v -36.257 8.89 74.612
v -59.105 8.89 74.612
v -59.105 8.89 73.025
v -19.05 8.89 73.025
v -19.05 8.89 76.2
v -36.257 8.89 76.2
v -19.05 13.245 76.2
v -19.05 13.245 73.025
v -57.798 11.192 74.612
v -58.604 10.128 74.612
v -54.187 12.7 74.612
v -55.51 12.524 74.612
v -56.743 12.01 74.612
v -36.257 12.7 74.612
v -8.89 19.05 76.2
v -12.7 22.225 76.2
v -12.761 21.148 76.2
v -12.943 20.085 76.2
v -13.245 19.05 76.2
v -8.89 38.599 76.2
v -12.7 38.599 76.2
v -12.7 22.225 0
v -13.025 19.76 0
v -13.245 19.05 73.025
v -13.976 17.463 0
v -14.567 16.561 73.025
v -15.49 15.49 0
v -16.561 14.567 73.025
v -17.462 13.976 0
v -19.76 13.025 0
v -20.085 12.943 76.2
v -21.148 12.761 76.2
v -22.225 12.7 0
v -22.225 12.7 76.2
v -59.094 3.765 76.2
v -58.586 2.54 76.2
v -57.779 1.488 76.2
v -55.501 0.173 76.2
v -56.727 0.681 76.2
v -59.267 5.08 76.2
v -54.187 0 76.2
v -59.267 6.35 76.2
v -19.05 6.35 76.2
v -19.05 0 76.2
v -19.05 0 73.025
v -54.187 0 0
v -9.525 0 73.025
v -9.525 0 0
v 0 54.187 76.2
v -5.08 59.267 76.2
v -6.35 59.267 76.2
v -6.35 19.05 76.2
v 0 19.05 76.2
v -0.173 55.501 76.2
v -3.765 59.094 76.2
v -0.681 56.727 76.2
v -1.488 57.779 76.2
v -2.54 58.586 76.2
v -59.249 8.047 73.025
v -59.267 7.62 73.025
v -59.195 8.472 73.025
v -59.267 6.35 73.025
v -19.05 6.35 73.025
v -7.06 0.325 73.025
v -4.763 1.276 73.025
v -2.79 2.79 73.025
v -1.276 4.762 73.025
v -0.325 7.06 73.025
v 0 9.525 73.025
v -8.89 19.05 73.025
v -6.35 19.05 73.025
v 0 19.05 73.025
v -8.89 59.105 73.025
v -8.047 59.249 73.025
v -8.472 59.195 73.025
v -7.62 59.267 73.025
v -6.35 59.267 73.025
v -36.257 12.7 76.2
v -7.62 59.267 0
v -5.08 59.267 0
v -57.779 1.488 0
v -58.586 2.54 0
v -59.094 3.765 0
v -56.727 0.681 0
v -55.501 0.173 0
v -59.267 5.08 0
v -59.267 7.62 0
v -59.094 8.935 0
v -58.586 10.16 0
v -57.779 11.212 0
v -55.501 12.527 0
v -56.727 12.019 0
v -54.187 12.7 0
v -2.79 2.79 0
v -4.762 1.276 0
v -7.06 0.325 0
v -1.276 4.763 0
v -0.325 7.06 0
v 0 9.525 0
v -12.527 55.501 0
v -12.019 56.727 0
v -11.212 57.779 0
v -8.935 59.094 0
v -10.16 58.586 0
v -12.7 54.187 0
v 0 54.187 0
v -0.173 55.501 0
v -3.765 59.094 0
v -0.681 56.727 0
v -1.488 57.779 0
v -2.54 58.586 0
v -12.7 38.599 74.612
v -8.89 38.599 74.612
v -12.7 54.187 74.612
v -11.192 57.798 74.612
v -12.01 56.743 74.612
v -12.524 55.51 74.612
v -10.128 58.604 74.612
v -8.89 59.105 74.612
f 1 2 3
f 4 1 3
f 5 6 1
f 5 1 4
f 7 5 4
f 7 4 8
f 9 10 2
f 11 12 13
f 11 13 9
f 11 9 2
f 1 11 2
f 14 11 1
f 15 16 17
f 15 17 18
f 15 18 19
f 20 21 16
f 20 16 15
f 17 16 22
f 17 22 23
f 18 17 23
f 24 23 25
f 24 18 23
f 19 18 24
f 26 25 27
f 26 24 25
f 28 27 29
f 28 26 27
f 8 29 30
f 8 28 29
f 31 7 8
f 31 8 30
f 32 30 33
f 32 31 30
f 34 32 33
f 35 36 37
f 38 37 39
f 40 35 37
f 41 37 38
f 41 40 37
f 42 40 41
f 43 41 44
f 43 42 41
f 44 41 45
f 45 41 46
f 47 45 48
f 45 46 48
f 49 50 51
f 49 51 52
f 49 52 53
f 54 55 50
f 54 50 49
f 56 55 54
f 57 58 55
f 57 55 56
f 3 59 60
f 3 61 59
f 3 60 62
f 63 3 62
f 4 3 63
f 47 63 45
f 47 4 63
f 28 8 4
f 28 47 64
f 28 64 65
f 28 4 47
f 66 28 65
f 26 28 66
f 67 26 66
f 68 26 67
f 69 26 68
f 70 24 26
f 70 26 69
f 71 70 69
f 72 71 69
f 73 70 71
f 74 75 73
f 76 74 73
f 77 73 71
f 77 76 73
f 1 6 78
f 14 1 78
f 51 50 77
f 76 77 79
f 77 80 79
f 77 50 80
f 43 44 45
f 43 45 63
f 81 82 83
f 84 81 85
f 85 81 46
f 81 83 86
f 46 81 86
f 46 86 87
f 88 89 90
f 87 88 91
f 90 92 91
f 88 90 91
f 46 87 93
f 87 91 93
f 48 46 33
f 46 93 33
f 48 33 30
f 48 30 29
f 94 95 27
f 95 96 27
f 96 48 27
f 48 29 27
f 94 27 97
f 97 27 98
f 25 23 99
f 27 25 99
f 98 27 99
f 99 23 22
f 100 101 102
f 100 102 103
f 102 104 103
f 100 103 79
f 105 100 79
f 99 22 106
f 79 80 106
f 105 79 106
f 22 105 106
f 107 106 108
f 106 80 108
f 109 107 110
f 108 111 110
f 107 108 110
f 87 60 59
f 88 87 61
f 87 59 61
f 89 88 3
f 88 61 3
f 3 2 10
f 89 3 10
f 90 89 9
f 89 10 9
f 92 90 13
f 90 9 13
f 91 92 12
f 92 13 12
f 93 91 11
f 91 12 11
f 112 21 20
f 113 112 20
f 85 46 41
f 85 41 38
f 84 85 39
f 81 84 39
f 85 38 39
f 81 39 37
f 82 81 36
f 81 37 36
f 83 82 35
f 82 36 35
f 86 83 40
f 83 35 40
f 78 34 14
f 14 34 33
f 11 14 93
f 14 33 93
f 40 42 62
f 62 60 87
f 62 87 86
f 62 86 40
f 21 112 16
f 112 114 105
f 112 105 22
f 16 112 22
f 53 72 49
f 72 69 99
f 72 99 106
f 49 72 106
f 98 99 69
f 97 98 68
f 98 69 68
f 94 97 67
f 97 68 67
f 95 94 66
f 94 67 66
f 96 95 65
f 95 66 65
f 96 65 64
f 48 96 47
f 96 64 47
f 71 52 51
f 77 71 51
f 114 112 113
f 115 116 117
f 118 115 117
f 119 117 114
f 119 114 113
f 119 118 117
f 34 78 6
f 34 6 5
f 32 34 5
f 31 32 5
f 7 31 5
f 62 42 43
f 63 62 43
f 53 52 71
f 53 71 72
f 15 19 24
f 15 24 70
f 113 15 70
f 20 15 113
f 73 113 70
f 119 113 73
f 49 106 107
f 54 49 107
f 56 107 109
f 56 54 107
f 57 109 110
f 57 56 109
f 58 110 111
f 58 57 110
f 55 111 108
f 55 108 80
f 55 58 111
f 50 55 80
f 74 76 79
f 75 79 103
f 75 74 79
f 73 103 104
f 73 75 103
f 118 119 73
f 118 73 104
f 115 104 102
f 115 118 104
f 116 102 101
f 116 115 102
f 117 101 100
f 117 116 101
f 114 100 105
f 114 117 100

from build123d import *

# Parameters (mm, degrees)
F1_DEPTH  = 76.2
F2_R      = 9.525
F4_W      = 19.05
F4_H      = 19.05
F5_DEPTH  = 3.175
F6_W      = 2.54
F6_H      = 44.45
F6_W_2    = 44.45
F6_H_2    = 2.54
F7_DEPTH  = 3.175
F8_R      = 5.08
F9_W      = 24.864539
F9_H      = 7.45066
F9_W_2    = 9.066464
F9_H_2    = 23.017317
F10_DEPTH = 1.5875


with BuildPart() as f1:
    # F0 (on Top) → F1 (new body)
    with BuildSketch(Plane.XY):
        Polygon((-12.7, 0), (0, 0), (0, 59.266667), (-12.7, 59.266667), (-12.7, 12.7), (-59.266667, 12.7), (-59.266667, 0), align=None)
    extrude(amount=F1_DEPTH)

    # F2
    f2_edges = [f1.edges().sort_by_distance(p)[0] for p in [
        (-12.7, 12.7, 38.1),
        (0, 0, 38.1),
    ]]
    fillet(f2_edges, radius=F2_R)

    # F4 (on offset) → F5 (cut)
    with BuildSketch(Plane.XY.offset(76.2)):
        with Locations((-9.525, 9.525)):
            Rectangle(F4_W, F4_H)
    extrude(amount=-F5_DEPTH, mode=Mode.SUBTRACT)

    # F6 (on offset) → F7 (cut)
    with BuildSketch(Plane.XY.offset(76.2)):
        with Locations((-7.62, 40.052507)):
            Rectangle(F6_W, F6_H)
        with Locations((-39.902898, 7.62)):
            Rectangle(F6_W_2, F6_H_2)
    extrude(amount=-F7_DEPTH, mode=Mode.SUBTRACT)

    # F8
    f8_edges = [f1.edges().sort_by_distance(p)[0] for p in [
        (-59.266667, 0, 38.1),
        (-59.266667, 12.7, 38.1),
        (-12.7, 59.266667, 38.1),
        (0, 59.266667, 38.1),
    ]]
    fillet(f8_edges, radius=F8_R)

    # F9 (on offset) → F10 (cut)
    with BuildSketch(Plane.XY.offset(76.2)):
        with Locations((-48.689407, 11.571373)):
            Rectangle(F9_W, F9_H)
        with Locations((-11.794715, 50.10781)):
            Rectangle(F9_W_2, F9_H_2)
    extrude(amount=-F10_DEPTH, mode=Mode.SUBTRACT)


solid = f1.part
